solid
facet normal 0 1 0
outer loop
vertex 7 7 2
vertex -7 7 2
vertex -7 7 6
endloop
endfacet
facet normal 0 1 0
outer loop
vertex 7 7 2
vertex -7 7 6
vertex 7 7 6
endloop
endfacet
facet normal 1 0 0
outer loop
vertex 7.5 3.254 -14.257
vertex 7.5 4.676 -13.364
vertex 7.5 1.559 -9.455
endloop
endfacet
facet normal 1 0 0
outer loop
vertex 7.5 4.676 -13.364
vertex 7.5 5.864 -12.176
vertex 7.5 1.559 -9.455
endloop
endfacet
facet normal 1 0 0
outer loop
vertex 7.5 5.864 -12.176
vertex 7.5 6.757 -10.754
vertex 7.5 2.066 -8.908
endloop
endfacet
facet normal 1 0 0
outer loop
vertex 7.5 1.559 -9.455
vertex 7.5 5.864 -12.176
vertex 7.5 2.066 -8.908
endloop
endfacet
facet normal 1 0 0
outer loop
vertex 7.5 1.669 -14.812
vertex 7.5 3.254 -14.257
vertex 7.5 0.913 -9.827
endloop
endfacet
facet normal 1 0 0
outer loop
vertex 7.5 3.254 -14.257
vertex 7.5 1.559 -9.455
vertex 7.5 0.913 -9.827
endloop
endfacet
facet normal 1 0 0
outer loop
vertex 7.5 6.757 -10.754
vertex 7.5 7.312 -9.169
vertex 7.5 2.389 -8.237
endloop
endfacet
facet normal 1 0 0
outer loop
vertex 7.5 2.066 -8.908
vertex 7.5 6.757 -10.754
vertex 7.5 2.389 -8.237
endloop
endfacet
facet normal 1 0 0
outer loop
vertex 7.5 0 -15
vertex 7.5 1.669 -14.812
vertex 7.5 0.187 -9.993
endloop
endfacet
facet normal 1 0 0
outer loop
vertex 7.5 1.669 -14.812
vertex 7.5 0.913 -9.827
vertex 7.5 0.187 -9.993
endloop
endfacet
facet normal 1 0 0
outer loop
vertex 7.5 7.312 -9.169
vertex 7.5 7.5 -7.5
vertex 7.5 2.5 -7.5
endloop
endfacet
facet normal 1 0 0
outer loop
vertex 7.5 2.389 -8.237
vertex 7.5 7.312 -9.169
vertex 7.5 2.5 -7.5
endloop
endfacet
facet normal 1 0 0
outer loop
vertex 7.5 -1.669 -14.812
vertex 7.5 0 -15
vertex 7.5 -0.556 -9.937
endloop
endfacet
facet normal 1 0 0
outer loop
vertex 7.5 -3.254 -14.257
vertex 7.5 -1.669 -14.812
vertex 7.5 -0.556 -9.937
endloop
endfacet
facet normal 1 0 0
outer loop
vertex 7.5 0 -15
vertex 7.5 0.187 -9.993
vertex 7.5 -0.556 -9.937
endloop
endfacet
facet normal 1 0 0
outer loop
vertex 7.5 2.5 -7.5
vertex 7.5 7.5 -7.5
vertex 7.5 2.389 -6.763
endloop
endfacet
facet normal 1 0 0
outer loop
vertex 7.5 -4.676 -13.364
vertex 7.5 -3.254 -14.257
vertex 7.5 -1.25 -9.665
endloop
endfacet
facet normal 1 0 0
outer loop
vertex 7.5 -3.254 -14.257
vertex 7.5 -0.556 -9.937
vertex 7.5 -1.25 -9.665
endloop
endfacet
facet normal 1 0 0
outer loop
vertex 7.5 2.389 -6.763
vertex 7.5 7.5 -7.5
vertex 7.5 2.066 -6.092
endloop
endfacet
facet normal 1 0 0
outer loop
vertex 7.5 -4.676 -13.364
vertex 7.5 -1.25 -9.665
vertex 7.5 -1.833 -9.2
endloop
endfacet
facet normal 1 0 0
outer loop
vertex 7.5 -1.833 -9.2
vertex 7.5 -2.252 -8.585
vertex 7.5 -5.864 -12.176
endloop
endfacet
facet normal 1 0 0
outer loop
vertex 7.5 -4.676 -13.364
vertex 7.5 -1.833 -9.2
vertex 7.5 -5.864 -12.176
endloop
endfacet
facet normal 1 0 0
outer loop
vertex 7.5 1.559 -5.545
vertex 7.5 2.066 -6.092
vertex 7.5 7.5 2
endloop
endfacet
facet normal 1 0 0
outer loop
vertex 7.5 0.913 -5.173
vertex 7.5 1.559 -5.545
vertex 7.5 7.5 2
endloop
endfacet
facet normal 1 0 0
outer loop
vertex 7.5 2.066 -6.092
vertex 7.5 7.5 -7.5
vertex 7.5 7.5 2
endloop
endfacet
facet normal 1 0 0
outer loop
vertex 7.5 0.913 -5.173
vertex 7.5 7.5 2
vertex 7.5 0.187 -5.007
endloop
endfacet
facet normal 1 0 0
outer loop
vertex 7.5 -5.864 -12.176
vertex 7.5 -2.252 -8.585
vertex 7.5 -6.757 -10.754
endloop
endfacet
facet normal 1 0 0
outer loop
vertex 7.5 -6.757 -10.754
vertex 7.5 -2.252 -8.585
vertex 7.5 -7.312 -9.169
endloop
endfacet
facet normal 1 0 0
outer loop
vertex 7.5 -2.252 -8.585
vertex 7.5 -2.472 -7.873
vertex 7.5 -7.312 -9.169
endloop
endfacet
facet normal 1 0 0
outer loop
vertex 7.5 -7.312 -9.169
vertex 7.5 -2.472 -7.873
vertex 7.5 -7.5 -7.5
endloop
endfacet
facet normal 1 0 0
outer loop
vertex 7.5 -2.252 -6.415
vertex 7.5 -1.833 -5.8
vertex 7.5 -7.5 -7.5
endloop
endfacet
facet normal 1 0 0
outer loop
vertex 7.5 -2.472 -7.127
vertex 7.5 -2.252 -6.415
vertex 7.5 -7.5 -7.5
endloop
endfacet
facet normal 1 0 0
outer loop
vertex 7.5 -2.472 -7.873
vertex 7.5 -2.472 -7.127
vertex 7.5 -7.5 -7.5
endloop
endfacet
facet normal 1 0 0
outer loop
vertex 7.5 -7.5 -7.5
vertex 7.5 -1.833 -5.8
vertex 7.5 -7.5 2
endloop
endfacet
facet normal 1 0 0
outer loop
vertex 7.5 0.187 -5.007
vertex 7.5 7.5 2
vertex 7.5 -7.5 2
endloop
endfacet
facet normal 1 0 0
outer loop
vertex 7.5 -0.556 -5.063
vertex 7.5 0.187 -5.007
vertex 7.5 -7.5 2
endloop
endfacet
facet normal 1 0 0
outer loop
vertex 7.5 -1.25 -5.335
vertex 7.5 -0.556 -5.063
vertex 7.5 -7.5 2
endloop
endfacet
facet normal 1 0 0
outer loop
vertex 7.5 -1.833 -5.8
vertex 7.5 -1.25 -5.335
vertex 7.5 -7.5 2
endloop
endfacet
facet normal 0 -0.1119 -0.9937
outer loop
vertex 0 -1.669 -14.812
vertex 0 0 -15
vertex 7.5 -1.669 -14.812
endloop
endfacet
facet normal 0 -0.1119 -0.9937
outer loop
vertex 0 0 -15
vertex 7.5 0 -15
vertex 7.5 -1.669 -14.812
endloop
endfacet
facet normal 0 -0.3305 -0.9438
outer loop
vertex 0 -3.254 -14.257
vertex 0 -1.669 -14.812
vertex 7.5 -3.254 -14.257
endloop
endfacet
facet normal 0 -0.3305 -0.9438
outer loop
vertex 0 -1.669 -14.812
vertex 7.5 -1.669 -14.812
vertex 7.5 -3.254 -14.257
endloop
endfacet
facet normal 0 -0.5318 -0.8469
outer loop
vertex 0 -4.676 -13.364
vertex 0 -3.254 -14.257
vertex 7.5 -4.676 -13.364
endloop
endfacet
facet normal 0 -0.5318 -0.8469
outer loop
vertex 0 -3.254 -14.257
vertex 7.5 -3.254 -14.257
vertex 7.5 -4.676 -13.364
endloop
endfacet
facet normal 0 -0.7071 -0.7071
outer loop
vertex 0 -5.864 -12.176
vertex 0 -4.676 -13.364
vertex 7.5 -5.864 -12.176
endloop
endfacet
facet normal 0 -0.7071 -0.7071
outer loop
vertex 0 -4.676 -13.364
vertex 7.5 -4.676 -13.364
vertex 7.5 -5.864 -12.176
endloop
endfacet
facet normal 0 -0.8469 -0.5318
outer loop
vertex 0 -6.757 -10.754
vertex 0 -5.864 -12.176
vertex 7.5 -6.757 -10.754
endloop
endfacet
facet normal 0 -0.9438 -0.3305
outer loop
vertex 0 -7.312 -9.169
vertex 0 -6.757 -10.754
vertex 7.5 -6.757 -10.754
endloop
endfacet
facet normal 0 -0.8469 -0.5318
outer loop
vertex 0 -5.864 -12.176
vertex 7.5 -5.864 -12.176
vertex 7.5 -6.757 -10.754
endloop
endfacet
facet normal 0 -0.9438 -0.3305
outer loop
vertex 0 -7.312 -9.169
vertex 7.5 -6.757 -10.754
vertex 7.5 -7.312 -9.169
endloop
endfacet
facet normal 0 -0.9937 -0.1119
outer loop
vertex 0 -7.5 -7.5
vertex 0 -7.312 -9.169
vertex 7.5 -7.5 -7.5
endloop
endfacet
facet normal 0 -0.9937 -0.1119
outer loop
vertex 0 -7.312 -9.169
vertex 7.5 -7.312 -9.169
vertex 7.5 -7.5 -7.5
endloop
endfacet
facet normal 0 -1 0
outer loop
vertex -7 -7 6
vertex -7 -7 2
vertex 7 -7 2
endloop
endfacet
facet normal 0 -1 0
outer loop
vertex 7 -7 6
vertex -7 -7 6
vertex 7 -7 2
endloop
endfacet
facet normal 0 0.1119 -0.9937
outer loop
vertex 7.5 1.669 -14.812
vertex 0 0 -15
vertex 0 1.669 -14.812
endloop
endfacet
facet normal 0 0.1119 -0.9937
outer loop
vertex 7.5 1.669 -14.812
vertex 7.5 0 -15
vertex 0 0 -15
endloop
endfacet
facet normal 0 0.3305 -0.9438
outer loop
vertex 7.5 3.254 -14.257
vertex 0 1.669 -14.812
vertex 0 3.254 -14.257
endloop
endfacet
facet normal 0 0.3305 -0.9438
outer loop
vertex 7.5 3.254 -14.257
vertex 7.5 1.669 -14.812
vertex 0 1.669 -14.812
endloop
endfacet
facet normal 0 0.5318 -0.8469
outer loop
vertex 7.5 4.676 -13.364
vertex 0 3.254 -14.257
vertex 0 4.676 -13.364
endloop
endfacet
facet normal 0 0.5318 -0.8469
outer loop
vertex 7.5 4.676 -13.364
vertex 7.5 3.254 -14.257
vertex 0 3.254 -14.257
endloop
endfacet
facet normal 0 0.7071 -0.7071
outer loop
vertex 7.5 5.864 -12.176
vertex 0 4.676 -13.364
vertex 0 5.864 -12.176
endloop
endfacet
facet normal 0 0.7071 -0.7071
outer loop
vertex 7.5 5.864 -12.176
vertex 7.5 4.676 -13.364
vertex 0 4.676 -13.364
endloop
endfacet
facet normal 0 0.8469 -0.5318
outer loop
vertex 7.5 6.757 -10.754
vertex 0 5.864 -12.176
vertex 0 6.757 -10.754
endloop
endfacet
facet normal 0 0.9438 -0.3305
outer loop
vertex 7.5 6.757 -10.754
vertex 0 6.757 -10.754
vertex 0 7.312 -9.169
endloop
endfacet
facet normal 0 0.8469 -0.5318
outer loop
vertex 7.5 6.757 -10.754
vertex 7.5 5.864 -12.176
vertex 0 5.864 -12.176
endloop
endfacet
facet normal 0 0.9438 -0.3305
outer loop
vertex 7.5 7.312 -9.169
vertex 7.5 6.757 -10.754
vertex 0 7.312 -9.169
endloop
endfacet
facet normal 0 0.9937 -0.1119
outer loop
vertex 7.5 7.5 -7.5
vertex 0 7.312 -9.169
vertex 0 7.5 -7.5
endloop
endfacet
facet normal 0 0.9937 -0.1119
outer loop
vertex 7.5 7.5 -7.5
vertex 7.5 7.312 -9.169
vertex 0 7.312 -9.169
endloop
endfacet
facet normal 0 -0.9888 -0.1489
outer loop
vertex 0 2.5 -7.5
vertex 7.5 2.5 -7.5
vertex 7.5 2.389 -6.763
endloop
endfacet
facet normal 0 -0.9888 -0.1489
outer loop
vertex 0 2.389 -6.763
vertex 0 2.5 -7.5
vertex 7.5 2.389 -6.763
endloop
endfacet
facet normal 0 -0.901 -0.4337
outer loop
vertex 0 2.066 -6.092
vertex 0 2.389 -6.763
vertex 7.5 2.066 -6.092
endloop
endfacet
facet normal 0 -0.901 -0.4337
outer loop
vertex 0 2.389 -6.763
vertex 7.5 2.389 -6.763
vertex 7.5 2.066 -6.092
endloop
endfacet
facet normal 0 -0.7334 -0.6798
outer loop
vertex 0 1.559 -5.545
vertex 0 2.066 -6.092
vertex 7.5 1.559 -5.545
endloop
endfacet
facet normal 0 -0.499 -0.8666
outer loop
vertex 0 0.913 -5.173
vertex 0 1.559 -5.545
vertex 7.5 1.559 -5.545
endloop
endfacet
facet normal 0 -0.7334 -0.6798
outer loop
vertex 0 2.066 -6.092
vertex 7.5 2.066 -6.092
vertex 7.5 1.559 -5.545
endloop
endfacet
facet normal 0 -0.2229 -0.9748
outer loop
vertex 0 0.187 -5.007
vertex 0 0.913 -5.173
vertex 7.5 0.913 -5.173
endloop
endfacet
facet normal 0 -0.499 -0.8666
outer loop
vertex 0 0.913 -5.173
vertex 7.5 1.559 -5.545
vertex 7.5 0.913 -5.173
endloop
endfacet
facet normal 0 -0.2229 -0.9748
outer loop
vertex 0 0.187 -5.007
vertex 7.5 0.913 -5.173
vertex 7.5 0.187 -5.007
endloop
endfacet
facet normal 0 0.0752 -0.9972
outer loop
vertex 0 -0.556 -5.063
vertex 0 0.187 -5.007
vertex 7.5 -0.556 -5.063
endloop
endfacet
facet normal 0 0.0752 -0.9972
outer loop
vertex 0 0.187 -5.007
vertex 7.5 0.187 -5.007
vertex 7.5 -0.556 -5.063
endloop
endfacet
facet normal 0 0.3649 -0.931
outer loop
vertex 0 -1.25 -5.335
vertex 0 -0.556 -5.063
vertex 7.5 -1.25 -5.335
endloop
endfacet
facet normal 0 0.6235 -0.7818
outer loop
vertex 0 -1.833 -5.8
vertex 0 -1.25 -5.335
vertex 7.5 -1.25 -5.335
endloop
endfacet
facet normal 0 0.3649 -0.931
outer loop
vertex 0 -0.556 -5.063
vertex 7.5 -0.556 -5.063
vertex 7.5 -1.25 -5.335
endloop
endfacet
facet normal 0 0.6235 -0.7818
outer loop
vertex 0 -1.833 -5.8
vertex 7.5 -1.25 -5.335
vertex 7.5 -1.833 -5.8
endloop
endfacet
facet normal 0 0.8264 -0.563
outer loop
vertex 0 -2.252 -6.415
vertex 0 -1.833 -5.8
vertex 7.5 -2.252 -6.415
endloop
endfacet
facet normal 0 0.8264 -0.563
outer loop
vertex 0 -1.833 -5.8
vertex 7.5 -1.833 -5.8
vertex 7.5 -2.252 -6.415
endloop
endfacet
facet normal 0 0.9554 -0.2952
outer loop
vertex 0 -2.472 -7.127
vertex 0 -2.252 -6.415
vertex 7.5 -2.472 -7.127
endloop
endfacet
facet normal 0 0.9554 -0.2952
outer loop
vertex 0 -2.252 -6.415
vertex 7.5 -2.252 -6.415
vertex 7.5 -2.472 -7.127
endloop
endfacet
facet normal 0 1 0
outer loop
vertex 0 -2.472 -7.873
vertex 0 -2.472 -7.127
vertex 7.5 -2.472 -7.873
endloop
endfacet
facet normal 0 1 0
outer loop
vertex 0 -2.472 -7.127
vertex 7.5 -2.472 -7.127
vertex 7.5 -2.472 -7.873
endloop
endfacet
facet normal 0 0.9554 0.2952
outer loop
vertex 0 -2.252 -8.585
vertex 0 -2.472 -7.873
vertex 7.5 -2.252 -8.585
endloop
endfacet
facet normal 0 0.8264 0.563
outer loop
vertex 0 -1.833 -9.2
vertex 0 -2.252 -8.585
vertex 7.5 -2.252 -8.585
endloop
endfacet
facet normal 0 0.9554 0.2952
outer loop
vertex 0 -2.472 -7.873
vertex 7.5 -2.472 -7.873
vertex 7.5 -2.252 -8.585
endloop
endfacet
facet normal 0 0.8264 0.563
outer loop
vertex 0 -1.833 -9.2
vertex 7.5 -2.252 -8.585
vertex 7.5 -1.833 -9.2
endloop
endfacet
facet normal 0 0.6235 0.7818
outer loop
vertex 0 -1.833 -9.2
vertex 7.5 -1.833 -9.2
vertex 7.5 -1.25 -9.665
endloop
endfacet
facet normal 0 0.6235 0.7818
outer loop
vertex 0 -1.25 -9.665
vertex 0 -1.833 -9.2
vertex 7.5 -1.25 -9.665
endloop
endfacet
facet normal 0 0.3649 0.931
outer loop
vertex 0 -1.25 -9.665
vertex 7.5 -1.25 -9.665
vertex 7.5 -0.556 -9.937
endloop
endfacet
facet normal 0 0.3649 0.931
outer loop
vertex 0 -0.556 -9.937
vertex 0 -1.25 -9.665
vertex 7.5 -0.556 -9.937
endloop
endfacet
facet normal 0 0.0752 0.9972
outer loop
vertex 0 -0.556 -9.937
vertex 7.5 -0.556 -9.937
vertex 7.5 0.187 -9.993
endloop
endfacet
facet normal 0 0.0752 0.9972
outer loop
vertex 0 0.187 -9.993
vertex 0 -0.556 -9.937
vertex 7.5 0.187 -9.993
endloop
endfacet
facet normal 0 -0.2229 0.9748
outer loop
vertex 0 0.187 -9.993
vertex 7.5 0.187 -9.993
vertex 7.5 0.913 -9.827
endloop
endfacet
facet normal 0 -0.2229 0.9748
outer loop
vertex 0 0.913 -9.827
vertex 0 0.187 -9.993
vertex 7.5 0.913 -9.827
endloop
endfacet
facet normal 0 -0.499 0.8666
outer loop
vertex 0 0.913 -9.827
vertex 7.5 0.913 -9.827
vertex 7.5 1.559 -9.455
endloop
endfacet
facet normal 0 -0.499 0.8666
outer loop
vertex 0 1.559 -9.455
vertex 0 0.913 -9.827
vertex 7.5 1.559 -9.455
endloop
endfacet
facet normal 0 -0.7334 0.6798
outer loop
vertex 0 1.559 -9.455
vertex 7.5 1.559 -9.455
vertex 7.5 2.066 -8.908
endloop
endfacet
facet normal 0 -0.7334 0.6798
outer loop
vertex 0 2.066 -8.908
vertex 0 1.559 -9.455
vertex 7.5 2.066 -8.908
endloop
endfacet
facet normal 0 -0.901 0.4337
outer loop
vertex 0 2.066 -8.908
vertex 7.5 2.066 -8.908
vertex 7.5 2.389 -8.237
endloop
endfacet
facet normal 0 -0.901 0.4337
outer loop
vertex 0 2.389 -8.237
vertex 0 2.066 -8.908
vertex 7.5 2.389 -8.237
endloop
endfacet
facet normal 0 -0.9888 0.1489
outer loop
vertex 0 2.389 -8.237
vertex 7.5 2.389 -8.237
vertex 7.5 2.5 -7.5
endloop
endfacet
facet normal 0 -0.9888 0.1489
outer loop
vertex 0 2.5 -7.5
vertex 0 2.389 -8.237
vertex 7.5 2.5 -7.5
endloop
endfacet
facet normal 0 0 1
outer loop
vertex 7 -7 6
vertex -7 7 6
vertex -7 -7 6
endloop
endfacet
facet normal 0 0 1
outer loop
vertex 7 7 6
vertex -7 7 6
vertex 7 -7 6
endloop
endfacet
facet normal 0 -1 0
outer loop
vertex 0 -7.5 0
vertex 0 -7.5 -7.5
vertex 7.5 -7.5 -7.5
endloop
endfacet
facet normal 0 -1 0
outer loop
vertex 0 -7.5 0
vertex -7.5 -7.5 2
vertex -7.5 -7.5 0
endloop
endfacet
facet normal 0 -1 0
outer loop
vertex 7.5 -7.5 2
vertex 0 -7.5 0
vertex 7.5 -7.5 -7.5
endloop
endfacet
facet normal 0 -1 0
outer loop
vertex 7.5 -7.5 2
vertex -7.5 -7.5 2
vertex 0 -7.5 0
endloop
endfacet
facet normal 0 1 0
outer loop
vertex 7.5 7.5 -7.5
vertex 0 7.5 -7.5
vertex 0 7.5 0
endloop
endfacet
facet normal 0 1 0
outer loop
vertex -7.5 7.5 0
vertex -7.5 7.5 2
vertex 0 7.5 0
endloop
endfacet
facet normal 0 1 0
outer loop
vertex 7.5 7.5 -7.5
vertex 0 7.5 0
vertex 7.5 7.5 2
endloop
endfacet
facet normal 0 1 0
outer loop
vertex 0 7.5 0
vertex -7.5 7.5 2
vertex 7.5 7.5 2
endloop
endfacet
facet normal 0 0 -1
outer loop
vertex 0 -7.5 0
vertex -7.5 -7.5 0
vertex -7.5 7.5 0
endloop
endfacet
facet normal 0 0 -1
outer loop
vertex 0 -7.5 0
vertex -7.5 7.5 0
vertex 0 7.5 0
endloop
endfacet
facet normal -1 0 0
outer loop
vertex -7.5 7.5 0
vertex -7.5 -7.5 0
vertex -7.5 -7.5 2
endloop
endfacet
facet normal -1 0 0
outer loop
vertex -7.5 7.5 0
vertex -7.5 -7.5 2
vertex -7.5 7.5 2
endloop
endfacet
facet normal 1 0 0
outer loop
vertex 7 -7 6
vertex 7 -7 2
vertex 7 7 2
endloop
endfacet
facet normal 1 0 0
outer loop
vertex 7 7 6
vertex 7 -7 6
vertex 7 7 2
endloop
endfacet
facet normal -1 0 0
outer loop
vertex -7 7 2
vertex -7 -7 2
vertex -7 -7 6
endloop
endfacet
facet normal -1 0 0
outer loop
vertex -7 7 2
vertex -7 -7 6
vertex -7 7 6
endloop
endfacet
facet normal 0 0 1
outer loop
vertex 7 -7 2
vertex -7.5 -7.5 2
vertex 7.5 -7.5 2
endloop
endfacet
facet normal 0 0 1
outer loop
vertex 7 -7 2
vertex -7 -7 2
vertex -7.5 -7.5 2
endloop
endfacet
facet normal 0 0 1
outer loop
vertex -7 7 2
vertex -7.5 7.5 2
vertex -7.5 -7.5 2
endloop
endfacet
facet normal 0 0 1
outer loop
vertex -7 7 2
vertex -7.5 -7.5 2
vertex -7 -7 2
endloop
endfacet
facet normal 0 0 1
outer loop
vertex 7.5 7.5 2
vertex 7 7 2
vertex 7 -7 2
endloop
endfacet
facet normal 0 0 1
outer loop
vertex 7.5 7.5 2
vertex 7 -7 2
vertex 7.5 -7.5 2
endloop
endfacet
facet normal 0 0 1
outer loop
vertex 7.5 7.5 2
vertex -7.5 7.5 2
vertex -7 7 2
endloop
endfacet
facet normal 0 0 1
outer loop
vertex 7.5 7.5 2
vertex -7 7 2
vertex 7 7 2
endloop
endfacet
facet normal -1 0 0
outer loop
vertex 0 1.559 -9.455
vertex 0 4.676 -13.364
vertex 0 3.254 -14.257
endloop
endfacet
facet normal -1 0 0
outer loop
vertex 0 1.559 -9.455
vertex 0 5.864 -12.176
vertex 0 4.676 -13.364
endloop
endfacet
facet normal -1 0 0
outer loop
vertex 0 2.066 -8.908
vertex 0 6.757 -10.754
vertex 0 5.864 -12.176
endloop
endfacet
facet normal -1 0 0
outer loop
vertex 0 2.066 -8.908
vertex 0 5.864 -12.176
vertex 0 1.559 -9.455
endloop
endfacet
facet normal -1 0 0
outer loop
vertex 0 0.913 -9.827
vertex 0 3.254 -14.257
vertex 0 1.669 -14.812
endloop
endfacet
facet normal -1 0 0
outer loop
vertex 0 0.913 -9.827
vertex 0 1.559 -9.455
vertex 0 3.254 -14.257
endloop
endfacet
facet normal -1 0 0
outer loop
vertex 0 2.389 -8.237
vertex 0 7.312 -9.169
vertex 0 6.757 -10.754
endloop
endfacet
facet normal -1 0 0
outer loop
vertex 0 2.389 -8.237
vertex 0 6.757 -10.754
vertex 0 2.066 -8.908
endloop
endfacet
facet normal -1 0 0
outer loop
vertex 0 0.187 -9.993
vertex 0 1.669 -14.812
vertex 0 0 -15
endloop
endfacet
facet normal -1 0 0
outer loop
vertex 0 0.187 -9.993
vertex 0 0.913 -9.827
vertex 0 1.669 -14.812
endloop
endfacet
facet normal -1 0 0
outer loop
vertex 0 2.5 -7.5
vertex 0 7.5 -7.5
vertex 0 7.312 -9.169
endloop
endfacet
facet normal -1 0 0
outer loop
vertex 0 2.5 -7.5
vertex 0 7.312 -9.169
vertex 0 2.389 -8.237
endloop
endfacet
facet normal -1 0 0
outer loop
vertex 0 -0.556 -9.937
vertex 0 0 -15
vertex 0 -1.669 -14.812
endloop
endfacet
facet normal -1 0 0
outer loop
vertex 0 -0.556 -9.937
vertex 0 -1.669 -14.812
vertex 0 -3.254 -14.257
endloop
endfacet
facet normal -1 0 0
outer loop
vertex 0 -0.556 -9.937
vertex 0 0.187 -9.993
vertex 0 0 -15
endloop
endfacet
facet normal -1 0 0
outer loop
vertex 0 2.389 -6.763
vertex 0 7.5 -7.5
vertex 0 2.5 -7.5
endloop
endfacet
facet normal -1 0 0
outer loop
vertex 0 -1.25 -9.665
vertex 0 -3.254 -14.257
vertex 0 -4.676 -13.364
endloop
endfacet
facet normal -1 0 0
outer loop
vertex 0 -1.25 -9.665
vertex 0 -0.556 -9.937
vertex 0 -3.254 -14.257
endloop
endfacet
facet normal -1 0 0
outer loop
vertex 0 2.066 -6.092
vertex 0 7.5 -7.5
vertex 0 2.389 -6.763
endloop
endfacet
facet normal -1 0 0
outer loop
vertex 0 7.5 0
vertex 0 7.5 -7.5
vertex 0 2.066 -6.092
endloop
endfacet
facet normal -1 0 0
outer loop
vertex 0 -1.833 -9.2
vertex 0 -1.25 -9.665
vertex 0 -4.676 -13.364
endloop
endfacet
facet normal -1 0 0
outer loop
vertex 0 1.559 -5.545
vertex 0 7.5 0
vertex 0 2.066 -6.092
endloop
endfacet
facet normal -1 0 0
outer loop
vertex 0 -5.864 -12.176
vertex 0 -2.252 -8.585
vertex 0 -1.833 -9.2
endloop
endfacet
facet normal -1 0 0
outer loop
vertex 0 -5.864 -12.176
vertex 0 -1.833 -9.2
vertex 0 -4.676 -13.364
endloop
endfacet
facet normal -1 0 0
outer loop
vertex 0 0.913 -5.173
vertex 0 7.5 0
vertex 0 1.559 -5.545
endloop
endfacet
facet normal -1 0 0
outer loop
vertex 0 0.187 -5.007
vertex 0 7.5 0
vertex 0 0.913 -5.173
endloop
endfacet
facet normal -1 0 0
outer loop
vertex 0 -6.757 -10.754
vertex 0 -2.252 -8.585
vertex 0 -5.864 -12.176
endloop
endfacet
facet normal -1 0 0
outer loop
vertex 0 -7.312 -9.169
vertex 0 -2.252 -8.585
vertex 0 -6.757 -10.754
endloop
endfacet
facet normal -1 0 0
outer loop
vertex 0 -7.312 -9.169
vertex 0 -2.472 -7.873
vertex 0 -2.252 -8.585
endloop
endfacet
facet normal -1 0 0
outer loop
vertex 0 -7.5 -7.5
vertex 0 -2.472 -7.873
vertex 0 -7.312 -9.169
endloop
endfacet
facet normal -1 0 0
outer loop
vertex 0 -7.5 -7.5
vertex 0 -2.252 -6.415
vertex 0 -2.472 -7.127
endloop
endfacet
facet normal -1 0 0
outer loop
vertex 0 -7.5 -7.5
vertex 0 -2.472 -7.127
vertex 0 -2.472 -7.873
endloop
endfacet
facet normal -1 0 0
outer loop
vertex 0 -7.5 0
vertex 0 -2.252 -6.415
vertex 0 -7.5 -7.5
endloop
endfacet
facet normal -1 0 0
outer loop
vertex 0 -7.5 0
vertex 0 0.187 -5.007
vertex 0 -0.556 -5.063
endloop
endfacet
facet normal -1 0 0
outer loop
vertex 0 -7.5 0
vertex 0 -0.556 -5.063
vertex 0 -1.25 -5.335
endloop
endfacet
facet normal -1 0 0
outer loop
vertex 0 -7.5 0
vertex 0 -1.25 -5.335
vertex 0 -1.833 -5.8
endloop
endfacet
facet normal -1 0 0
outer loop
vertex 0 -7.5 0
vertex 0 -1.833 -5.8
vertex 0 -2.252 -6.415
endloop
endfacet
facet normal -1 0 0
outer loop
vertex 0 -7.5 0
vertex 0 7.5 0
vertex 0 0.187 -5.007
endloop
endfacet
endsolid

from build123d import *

# Parameters (mm, degrees)
F0_W     = 15
F0_H     = 15
F0_W_2   = 14
F0_H_2   = 14
F1_DEPTH = 2
F2_DEPTH = 6
F3_W     = 7.5
F3_H     = 15
F4_DEPTH = 15
F5_R     = 7.49999
F6_R     = 2.5
F7_DEPTH = 25


# Not quite as in the source:
# - a fillet or chamfer is up to 0.001 mm smaller than in the source, because OpenCascade refuses the exact size


with BuildPart() as f1:
    # F0 (on Top) → F1 (new body)
    with BuildSketch(Plane.XY):
        Rectangle(F0_W, F0_H)
        Rectangle(F0_W_2, F0_H_2, mode=Mode.SUBTRACT)
    extrude(amount=F1_DEPTH)

    # F0 (on Top) → F2 (join)
    with BuildSketch(Plane.XY):
        Rectangle(F0_W_2, F0_H_2)
    extrude(amount=F2_DEPTH)

    # F3 (on face) → F4 (join)
    with BuildSketch(Plane(origin=(0, 0, 0), x_dir=(1, 0, 0), z_dir=(0, 0, -1))):
        with Locations((3.75, 0)):
            Rectangle(F3_W, F3_H)
    extrude(amount=F4_DEPTH)

    # F5 (radius 7.5 in the source; OpenCascade refuses exactly that, so slightly less here)
    f5_edges = [f1.edges().sort_by_distance(p)[0] for p in [
        (3.75, 7.5, -15),
        (3.75, -7.5, -15),
    ]]
    fillet(f5_edges, radius=F5_R)

    # F6 (on face) → F7 (cut)
    with BuildSketch(Plane.YZ.offset(7.5)):
        with Locations((0, -7.5)):
            Circle(F6_R)
    extrude(amount=-F7_DEPTH, mode=Mode.SUBTRACT)


solid = f1.part
